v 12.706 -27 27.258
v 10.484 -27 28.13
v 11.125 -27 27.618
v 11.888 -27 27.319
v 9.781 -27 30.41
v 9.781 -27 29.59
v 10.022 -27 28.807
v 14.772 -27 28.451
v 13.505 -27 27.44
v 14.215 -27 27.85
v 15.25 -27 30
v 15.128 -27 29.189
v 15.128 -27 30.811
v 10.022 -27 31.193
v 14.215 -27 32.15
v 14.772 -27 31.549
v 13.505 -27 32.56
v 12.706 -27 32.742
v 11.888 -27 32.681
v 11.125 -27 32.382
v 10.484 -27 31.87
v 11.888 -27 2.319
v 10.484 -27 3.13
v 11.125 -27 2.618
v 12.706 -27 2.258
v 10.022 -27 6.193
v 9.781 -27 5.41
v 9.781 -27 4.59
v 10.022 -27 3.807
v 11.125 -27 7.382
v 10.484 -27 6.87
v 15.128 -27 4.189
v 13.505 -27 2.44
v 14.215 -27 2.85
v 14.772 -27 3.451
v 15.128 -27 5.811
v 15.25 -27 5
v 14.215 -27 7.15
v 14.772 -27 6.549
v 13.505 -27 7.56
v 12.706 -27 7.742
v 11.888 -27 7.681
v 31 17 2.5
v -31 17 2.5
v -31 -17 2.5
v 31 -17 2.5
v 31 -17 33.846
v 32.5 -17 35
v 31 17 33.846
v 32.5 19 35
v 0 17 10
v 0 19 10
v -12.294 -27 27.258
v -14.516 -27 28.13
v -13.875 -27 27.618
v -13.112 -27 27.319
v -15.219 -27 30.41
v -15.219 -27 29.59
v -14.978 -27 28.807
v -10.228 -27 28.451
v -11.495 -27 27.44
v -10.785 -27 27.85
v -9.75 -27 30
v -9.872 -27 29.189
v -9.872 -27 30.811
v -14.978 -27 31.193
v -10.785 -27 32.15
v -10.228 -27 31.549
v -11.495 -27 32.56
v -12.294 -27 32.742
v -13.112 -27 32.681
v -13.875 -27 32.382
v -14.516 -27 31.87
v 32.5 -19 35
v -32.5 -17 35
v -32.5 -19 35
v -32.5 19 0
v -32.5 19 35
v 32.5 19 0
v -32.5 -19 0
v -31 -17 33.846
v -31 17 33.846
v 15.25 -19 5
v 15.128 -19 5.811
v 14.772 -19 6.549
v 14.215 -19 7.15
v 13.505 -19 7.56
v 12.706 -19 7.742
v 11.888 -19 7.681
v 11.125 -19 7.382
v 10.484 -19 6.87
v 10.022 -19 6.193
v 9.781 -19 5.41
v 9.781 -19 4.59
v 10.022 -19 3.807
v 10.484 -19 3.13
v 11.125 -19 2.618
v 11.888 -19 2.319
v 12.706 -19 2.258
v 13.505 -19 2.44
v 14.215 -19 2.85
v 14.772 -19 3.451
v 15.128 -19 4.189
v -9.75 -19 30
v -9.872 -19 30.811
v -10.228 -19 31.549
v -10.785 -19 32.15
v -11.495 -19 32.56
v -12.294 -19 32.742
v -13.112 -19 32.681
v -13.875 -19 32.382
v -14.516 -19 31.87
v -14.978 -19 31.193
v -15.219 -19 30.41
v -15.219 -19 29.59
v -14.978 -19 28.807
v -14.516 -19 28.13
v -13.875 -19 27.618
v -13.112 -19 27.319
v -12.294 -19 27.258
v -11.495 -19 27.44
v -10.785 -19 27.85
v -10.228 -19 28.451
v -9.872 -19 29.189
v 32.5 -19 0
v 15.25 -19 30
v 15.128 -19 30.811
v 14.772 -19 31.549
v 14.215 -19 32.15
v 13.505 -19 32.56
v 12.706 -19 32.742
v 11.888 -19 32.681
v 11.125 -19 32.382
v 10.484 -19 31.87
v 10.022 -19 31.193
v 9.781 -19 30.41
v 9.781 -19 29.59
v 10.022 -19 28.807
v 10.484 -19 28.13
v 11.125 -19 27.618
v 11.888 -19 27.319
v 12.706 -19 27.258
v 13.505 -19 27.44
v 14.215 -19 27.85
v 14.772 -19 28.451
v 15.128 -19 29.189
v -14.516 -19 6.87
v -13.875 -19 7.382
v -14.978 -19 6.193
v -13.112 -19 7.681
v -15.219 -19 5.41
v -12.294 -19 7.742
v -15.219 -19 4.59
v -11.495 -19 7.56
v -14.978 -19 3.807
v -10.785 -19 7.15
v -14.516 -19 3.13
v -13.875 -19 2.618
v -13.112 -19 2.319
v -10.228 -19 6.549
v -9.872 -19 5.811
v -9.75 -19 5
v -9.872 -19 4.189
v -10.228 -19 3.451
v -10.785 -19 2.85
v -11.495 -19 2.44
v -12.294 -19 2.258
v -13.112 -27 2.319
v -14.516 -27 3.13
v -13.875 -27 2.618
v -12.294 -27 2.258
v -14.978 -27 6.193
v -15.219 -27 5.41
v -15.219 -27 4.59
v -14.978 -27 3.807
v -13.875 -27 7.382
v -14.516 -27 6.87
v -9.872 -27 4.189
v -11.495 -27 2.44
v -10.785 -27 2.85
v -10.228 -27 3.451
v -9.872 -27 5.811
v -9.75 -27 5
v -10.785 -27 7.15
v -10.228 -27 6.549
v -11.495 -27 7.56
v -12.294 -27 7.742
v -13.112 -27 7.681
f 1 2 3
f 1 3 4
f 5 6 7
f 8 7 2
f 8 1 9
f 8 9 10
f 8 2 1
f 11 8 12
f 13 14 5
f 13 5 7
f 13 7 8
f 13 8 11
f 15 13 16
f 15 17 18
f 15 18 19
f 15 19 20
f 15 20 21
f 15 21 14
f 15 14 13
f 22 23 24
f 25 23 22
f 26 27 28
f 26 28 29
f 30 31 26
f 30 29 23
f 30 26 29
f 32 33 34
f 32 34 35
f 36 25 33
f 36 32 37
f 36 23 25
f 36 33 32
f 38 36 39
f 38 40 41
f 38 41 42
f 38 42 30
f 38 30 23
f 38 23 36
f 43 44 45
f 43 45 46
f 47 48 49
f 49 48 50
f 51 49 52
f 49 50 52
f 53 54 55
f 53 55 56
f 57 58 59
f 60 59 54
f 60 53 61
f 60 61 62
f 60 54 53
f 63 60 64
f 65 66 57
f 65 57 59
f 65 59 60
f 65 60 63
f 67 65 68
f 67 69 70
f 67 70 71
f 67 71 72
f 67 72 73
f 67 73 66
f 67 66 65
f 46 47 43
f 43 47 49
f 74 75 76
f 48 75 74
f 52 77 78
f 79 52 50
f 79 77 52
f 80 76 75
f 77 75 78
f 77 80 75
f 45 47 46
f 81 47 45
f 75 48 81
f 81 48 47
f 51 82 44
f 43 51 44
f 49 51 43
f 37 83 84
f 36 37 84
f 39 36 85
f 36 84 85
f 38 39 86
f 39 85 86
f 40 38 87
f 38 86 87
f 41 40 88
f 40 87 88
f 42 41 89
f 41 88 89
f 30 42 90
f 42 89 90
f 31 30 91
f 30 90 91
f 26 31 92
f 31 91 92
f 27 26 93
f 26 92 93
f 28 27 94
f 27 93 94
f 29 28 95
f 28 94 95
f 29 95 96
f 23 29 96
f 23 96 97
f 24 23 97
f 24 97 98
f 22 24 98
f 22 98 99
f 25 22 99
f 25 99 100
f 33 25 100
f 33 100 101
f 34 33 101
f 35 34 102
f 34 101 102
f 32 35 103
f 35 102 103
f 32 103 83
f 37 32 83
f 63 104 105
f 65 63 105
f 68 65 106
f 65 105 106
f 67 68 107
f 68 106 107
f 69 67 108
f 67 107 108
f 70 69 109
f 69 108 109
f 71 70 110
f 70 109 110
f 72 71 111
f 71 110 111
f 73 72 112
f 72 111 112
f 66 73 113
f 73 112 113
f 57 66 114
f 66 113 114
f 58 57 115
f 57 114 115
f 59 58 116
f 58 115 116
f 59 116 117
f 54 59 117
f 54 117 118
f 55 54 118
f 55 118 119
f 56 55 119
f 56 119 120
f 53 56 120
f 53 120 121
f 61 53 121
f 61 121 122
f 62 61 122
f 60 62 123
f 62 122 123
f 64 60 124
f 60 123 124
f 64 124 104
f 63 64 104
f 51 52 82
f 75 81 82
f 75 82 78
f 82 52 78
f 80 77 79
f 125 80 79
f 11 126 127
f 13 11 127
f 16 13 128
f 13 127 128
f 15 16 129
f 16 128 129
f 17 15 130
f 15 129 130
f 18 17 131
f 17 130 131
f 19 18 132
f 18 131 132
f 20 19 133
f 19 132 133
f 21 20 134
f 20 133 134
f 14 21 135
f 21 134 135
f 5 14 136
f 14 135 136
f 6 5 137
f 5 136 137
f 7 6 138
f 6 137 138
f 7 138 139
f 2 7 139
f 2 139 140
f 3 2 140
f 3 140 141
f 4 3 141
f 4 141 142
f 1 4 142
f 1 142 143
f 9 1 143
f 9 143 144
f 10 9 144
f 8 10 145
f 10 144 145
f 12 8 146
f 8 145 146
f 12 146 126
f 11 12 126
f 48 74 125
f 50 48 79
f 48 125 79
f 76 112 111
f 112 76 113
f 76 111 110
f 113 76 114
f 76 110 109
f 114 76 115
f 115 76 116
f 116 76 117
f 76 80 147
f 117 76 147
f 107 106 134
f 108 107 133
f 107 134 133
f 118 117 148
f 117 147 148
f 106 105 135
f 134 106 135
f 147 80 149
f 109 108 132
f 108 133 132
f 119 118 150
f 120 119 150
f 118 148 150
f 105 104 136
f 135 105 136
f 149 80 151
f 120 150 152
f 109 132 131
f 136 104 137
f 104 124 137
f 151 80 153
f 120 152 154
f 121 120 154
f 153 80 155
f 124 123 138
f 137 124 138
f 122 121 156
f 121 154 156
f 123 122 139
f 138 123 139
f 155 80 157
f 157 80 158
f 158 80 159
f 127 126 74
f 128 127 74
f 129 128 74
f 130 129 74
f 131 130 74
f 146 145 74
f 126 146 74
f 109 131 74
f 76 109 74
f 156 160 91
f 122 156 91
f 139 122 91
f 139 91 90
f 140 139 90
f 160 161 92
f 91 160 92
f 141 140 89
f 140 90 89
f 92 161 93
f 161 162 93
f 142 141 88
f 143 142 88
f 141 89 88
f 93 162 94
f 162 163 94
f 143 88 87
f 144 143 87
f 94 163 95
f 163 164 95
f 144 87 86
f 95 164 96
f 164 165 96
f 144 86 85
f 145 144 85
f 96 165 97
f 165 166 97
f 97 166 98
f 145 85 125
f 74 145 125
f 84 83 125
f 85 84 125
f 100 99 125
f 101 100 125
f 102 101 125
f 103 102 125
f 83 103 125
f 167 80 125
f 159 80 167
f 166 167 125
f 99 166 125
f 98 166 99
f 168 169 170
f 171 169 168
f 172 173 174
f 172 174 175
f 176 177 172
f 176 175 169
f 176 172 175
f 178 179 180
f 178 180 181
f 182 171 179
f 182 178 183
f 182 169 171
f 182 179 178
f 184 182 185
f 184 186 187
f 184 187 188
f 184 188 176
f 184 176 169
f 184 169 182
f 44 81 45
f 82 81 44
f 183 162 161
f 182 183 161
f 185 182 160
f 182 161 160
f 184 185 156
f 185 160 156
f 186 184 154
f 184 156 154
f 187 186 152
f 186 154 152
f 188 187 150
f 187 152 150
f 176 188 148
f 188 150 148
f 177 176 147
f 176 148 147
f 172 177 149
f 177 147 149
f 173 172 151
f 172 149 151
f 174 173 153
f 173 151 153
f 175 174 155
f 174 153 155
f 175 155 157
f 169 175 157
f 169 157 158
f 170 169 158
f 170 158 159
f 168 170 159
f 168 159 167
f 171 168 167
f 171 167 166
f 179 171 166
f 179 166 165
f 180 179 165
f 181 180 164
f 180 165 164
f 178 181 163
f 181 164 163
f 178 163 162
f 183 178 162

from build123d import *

# Parameters (mm, degrees)
F0_W     = 65
F0_H     = 38
F1_DEPTH = 35
F2_W     = 62
F2_H     = 34
F3_DEPTH = 32.5
F4_R     = 2.75
F5_DEPTH = 8
F7_DEPTH = 36


with BuildPart() as f1:
    # F0 (on Top) → F1 (new body)
    with BuildSketch(Plane.XY):
        Rectangle(F0_W, F0_H)
    extrude(amount=F1_DEPTH)

    # F2 (on face) → F3 (cut)
    with BuildSketch(Plane.XY.offset(35)):
        Rectangle(F2_W, F2_H)
    extrude(amount=-F3_DEPTH, mode=Mode.SUBTRACT)

    # F4 (on face) → F5 (join)
    with BuildSketch(Plane.XZ.offset(19)):
        with Locations((-12.5, 5)):
            Circle(F4_R)
        with Locations((-12.5, 30)):
            Circle(F4_R)
        with Locations((12.5, 30)):
            Circle(F4_R)
        with Locations((12.5, 5)):
            Circle(F4_R)
    extrude(amount=F5_DEPTH)

    # F6 (on face) → F7 (cut, through all)
    with BuildSketch(Plane(origin=(0, 19, 0), x_dir=(-1, 0, 0), z_dir=(0, 1, 0))):
        Polygon((32.5, 35), (-32.5, 35), (0, 10), align=None)
    extrude(amount=-F7_DEPTH, mode=Mode.SUBTRACT)


solid = f1.part
